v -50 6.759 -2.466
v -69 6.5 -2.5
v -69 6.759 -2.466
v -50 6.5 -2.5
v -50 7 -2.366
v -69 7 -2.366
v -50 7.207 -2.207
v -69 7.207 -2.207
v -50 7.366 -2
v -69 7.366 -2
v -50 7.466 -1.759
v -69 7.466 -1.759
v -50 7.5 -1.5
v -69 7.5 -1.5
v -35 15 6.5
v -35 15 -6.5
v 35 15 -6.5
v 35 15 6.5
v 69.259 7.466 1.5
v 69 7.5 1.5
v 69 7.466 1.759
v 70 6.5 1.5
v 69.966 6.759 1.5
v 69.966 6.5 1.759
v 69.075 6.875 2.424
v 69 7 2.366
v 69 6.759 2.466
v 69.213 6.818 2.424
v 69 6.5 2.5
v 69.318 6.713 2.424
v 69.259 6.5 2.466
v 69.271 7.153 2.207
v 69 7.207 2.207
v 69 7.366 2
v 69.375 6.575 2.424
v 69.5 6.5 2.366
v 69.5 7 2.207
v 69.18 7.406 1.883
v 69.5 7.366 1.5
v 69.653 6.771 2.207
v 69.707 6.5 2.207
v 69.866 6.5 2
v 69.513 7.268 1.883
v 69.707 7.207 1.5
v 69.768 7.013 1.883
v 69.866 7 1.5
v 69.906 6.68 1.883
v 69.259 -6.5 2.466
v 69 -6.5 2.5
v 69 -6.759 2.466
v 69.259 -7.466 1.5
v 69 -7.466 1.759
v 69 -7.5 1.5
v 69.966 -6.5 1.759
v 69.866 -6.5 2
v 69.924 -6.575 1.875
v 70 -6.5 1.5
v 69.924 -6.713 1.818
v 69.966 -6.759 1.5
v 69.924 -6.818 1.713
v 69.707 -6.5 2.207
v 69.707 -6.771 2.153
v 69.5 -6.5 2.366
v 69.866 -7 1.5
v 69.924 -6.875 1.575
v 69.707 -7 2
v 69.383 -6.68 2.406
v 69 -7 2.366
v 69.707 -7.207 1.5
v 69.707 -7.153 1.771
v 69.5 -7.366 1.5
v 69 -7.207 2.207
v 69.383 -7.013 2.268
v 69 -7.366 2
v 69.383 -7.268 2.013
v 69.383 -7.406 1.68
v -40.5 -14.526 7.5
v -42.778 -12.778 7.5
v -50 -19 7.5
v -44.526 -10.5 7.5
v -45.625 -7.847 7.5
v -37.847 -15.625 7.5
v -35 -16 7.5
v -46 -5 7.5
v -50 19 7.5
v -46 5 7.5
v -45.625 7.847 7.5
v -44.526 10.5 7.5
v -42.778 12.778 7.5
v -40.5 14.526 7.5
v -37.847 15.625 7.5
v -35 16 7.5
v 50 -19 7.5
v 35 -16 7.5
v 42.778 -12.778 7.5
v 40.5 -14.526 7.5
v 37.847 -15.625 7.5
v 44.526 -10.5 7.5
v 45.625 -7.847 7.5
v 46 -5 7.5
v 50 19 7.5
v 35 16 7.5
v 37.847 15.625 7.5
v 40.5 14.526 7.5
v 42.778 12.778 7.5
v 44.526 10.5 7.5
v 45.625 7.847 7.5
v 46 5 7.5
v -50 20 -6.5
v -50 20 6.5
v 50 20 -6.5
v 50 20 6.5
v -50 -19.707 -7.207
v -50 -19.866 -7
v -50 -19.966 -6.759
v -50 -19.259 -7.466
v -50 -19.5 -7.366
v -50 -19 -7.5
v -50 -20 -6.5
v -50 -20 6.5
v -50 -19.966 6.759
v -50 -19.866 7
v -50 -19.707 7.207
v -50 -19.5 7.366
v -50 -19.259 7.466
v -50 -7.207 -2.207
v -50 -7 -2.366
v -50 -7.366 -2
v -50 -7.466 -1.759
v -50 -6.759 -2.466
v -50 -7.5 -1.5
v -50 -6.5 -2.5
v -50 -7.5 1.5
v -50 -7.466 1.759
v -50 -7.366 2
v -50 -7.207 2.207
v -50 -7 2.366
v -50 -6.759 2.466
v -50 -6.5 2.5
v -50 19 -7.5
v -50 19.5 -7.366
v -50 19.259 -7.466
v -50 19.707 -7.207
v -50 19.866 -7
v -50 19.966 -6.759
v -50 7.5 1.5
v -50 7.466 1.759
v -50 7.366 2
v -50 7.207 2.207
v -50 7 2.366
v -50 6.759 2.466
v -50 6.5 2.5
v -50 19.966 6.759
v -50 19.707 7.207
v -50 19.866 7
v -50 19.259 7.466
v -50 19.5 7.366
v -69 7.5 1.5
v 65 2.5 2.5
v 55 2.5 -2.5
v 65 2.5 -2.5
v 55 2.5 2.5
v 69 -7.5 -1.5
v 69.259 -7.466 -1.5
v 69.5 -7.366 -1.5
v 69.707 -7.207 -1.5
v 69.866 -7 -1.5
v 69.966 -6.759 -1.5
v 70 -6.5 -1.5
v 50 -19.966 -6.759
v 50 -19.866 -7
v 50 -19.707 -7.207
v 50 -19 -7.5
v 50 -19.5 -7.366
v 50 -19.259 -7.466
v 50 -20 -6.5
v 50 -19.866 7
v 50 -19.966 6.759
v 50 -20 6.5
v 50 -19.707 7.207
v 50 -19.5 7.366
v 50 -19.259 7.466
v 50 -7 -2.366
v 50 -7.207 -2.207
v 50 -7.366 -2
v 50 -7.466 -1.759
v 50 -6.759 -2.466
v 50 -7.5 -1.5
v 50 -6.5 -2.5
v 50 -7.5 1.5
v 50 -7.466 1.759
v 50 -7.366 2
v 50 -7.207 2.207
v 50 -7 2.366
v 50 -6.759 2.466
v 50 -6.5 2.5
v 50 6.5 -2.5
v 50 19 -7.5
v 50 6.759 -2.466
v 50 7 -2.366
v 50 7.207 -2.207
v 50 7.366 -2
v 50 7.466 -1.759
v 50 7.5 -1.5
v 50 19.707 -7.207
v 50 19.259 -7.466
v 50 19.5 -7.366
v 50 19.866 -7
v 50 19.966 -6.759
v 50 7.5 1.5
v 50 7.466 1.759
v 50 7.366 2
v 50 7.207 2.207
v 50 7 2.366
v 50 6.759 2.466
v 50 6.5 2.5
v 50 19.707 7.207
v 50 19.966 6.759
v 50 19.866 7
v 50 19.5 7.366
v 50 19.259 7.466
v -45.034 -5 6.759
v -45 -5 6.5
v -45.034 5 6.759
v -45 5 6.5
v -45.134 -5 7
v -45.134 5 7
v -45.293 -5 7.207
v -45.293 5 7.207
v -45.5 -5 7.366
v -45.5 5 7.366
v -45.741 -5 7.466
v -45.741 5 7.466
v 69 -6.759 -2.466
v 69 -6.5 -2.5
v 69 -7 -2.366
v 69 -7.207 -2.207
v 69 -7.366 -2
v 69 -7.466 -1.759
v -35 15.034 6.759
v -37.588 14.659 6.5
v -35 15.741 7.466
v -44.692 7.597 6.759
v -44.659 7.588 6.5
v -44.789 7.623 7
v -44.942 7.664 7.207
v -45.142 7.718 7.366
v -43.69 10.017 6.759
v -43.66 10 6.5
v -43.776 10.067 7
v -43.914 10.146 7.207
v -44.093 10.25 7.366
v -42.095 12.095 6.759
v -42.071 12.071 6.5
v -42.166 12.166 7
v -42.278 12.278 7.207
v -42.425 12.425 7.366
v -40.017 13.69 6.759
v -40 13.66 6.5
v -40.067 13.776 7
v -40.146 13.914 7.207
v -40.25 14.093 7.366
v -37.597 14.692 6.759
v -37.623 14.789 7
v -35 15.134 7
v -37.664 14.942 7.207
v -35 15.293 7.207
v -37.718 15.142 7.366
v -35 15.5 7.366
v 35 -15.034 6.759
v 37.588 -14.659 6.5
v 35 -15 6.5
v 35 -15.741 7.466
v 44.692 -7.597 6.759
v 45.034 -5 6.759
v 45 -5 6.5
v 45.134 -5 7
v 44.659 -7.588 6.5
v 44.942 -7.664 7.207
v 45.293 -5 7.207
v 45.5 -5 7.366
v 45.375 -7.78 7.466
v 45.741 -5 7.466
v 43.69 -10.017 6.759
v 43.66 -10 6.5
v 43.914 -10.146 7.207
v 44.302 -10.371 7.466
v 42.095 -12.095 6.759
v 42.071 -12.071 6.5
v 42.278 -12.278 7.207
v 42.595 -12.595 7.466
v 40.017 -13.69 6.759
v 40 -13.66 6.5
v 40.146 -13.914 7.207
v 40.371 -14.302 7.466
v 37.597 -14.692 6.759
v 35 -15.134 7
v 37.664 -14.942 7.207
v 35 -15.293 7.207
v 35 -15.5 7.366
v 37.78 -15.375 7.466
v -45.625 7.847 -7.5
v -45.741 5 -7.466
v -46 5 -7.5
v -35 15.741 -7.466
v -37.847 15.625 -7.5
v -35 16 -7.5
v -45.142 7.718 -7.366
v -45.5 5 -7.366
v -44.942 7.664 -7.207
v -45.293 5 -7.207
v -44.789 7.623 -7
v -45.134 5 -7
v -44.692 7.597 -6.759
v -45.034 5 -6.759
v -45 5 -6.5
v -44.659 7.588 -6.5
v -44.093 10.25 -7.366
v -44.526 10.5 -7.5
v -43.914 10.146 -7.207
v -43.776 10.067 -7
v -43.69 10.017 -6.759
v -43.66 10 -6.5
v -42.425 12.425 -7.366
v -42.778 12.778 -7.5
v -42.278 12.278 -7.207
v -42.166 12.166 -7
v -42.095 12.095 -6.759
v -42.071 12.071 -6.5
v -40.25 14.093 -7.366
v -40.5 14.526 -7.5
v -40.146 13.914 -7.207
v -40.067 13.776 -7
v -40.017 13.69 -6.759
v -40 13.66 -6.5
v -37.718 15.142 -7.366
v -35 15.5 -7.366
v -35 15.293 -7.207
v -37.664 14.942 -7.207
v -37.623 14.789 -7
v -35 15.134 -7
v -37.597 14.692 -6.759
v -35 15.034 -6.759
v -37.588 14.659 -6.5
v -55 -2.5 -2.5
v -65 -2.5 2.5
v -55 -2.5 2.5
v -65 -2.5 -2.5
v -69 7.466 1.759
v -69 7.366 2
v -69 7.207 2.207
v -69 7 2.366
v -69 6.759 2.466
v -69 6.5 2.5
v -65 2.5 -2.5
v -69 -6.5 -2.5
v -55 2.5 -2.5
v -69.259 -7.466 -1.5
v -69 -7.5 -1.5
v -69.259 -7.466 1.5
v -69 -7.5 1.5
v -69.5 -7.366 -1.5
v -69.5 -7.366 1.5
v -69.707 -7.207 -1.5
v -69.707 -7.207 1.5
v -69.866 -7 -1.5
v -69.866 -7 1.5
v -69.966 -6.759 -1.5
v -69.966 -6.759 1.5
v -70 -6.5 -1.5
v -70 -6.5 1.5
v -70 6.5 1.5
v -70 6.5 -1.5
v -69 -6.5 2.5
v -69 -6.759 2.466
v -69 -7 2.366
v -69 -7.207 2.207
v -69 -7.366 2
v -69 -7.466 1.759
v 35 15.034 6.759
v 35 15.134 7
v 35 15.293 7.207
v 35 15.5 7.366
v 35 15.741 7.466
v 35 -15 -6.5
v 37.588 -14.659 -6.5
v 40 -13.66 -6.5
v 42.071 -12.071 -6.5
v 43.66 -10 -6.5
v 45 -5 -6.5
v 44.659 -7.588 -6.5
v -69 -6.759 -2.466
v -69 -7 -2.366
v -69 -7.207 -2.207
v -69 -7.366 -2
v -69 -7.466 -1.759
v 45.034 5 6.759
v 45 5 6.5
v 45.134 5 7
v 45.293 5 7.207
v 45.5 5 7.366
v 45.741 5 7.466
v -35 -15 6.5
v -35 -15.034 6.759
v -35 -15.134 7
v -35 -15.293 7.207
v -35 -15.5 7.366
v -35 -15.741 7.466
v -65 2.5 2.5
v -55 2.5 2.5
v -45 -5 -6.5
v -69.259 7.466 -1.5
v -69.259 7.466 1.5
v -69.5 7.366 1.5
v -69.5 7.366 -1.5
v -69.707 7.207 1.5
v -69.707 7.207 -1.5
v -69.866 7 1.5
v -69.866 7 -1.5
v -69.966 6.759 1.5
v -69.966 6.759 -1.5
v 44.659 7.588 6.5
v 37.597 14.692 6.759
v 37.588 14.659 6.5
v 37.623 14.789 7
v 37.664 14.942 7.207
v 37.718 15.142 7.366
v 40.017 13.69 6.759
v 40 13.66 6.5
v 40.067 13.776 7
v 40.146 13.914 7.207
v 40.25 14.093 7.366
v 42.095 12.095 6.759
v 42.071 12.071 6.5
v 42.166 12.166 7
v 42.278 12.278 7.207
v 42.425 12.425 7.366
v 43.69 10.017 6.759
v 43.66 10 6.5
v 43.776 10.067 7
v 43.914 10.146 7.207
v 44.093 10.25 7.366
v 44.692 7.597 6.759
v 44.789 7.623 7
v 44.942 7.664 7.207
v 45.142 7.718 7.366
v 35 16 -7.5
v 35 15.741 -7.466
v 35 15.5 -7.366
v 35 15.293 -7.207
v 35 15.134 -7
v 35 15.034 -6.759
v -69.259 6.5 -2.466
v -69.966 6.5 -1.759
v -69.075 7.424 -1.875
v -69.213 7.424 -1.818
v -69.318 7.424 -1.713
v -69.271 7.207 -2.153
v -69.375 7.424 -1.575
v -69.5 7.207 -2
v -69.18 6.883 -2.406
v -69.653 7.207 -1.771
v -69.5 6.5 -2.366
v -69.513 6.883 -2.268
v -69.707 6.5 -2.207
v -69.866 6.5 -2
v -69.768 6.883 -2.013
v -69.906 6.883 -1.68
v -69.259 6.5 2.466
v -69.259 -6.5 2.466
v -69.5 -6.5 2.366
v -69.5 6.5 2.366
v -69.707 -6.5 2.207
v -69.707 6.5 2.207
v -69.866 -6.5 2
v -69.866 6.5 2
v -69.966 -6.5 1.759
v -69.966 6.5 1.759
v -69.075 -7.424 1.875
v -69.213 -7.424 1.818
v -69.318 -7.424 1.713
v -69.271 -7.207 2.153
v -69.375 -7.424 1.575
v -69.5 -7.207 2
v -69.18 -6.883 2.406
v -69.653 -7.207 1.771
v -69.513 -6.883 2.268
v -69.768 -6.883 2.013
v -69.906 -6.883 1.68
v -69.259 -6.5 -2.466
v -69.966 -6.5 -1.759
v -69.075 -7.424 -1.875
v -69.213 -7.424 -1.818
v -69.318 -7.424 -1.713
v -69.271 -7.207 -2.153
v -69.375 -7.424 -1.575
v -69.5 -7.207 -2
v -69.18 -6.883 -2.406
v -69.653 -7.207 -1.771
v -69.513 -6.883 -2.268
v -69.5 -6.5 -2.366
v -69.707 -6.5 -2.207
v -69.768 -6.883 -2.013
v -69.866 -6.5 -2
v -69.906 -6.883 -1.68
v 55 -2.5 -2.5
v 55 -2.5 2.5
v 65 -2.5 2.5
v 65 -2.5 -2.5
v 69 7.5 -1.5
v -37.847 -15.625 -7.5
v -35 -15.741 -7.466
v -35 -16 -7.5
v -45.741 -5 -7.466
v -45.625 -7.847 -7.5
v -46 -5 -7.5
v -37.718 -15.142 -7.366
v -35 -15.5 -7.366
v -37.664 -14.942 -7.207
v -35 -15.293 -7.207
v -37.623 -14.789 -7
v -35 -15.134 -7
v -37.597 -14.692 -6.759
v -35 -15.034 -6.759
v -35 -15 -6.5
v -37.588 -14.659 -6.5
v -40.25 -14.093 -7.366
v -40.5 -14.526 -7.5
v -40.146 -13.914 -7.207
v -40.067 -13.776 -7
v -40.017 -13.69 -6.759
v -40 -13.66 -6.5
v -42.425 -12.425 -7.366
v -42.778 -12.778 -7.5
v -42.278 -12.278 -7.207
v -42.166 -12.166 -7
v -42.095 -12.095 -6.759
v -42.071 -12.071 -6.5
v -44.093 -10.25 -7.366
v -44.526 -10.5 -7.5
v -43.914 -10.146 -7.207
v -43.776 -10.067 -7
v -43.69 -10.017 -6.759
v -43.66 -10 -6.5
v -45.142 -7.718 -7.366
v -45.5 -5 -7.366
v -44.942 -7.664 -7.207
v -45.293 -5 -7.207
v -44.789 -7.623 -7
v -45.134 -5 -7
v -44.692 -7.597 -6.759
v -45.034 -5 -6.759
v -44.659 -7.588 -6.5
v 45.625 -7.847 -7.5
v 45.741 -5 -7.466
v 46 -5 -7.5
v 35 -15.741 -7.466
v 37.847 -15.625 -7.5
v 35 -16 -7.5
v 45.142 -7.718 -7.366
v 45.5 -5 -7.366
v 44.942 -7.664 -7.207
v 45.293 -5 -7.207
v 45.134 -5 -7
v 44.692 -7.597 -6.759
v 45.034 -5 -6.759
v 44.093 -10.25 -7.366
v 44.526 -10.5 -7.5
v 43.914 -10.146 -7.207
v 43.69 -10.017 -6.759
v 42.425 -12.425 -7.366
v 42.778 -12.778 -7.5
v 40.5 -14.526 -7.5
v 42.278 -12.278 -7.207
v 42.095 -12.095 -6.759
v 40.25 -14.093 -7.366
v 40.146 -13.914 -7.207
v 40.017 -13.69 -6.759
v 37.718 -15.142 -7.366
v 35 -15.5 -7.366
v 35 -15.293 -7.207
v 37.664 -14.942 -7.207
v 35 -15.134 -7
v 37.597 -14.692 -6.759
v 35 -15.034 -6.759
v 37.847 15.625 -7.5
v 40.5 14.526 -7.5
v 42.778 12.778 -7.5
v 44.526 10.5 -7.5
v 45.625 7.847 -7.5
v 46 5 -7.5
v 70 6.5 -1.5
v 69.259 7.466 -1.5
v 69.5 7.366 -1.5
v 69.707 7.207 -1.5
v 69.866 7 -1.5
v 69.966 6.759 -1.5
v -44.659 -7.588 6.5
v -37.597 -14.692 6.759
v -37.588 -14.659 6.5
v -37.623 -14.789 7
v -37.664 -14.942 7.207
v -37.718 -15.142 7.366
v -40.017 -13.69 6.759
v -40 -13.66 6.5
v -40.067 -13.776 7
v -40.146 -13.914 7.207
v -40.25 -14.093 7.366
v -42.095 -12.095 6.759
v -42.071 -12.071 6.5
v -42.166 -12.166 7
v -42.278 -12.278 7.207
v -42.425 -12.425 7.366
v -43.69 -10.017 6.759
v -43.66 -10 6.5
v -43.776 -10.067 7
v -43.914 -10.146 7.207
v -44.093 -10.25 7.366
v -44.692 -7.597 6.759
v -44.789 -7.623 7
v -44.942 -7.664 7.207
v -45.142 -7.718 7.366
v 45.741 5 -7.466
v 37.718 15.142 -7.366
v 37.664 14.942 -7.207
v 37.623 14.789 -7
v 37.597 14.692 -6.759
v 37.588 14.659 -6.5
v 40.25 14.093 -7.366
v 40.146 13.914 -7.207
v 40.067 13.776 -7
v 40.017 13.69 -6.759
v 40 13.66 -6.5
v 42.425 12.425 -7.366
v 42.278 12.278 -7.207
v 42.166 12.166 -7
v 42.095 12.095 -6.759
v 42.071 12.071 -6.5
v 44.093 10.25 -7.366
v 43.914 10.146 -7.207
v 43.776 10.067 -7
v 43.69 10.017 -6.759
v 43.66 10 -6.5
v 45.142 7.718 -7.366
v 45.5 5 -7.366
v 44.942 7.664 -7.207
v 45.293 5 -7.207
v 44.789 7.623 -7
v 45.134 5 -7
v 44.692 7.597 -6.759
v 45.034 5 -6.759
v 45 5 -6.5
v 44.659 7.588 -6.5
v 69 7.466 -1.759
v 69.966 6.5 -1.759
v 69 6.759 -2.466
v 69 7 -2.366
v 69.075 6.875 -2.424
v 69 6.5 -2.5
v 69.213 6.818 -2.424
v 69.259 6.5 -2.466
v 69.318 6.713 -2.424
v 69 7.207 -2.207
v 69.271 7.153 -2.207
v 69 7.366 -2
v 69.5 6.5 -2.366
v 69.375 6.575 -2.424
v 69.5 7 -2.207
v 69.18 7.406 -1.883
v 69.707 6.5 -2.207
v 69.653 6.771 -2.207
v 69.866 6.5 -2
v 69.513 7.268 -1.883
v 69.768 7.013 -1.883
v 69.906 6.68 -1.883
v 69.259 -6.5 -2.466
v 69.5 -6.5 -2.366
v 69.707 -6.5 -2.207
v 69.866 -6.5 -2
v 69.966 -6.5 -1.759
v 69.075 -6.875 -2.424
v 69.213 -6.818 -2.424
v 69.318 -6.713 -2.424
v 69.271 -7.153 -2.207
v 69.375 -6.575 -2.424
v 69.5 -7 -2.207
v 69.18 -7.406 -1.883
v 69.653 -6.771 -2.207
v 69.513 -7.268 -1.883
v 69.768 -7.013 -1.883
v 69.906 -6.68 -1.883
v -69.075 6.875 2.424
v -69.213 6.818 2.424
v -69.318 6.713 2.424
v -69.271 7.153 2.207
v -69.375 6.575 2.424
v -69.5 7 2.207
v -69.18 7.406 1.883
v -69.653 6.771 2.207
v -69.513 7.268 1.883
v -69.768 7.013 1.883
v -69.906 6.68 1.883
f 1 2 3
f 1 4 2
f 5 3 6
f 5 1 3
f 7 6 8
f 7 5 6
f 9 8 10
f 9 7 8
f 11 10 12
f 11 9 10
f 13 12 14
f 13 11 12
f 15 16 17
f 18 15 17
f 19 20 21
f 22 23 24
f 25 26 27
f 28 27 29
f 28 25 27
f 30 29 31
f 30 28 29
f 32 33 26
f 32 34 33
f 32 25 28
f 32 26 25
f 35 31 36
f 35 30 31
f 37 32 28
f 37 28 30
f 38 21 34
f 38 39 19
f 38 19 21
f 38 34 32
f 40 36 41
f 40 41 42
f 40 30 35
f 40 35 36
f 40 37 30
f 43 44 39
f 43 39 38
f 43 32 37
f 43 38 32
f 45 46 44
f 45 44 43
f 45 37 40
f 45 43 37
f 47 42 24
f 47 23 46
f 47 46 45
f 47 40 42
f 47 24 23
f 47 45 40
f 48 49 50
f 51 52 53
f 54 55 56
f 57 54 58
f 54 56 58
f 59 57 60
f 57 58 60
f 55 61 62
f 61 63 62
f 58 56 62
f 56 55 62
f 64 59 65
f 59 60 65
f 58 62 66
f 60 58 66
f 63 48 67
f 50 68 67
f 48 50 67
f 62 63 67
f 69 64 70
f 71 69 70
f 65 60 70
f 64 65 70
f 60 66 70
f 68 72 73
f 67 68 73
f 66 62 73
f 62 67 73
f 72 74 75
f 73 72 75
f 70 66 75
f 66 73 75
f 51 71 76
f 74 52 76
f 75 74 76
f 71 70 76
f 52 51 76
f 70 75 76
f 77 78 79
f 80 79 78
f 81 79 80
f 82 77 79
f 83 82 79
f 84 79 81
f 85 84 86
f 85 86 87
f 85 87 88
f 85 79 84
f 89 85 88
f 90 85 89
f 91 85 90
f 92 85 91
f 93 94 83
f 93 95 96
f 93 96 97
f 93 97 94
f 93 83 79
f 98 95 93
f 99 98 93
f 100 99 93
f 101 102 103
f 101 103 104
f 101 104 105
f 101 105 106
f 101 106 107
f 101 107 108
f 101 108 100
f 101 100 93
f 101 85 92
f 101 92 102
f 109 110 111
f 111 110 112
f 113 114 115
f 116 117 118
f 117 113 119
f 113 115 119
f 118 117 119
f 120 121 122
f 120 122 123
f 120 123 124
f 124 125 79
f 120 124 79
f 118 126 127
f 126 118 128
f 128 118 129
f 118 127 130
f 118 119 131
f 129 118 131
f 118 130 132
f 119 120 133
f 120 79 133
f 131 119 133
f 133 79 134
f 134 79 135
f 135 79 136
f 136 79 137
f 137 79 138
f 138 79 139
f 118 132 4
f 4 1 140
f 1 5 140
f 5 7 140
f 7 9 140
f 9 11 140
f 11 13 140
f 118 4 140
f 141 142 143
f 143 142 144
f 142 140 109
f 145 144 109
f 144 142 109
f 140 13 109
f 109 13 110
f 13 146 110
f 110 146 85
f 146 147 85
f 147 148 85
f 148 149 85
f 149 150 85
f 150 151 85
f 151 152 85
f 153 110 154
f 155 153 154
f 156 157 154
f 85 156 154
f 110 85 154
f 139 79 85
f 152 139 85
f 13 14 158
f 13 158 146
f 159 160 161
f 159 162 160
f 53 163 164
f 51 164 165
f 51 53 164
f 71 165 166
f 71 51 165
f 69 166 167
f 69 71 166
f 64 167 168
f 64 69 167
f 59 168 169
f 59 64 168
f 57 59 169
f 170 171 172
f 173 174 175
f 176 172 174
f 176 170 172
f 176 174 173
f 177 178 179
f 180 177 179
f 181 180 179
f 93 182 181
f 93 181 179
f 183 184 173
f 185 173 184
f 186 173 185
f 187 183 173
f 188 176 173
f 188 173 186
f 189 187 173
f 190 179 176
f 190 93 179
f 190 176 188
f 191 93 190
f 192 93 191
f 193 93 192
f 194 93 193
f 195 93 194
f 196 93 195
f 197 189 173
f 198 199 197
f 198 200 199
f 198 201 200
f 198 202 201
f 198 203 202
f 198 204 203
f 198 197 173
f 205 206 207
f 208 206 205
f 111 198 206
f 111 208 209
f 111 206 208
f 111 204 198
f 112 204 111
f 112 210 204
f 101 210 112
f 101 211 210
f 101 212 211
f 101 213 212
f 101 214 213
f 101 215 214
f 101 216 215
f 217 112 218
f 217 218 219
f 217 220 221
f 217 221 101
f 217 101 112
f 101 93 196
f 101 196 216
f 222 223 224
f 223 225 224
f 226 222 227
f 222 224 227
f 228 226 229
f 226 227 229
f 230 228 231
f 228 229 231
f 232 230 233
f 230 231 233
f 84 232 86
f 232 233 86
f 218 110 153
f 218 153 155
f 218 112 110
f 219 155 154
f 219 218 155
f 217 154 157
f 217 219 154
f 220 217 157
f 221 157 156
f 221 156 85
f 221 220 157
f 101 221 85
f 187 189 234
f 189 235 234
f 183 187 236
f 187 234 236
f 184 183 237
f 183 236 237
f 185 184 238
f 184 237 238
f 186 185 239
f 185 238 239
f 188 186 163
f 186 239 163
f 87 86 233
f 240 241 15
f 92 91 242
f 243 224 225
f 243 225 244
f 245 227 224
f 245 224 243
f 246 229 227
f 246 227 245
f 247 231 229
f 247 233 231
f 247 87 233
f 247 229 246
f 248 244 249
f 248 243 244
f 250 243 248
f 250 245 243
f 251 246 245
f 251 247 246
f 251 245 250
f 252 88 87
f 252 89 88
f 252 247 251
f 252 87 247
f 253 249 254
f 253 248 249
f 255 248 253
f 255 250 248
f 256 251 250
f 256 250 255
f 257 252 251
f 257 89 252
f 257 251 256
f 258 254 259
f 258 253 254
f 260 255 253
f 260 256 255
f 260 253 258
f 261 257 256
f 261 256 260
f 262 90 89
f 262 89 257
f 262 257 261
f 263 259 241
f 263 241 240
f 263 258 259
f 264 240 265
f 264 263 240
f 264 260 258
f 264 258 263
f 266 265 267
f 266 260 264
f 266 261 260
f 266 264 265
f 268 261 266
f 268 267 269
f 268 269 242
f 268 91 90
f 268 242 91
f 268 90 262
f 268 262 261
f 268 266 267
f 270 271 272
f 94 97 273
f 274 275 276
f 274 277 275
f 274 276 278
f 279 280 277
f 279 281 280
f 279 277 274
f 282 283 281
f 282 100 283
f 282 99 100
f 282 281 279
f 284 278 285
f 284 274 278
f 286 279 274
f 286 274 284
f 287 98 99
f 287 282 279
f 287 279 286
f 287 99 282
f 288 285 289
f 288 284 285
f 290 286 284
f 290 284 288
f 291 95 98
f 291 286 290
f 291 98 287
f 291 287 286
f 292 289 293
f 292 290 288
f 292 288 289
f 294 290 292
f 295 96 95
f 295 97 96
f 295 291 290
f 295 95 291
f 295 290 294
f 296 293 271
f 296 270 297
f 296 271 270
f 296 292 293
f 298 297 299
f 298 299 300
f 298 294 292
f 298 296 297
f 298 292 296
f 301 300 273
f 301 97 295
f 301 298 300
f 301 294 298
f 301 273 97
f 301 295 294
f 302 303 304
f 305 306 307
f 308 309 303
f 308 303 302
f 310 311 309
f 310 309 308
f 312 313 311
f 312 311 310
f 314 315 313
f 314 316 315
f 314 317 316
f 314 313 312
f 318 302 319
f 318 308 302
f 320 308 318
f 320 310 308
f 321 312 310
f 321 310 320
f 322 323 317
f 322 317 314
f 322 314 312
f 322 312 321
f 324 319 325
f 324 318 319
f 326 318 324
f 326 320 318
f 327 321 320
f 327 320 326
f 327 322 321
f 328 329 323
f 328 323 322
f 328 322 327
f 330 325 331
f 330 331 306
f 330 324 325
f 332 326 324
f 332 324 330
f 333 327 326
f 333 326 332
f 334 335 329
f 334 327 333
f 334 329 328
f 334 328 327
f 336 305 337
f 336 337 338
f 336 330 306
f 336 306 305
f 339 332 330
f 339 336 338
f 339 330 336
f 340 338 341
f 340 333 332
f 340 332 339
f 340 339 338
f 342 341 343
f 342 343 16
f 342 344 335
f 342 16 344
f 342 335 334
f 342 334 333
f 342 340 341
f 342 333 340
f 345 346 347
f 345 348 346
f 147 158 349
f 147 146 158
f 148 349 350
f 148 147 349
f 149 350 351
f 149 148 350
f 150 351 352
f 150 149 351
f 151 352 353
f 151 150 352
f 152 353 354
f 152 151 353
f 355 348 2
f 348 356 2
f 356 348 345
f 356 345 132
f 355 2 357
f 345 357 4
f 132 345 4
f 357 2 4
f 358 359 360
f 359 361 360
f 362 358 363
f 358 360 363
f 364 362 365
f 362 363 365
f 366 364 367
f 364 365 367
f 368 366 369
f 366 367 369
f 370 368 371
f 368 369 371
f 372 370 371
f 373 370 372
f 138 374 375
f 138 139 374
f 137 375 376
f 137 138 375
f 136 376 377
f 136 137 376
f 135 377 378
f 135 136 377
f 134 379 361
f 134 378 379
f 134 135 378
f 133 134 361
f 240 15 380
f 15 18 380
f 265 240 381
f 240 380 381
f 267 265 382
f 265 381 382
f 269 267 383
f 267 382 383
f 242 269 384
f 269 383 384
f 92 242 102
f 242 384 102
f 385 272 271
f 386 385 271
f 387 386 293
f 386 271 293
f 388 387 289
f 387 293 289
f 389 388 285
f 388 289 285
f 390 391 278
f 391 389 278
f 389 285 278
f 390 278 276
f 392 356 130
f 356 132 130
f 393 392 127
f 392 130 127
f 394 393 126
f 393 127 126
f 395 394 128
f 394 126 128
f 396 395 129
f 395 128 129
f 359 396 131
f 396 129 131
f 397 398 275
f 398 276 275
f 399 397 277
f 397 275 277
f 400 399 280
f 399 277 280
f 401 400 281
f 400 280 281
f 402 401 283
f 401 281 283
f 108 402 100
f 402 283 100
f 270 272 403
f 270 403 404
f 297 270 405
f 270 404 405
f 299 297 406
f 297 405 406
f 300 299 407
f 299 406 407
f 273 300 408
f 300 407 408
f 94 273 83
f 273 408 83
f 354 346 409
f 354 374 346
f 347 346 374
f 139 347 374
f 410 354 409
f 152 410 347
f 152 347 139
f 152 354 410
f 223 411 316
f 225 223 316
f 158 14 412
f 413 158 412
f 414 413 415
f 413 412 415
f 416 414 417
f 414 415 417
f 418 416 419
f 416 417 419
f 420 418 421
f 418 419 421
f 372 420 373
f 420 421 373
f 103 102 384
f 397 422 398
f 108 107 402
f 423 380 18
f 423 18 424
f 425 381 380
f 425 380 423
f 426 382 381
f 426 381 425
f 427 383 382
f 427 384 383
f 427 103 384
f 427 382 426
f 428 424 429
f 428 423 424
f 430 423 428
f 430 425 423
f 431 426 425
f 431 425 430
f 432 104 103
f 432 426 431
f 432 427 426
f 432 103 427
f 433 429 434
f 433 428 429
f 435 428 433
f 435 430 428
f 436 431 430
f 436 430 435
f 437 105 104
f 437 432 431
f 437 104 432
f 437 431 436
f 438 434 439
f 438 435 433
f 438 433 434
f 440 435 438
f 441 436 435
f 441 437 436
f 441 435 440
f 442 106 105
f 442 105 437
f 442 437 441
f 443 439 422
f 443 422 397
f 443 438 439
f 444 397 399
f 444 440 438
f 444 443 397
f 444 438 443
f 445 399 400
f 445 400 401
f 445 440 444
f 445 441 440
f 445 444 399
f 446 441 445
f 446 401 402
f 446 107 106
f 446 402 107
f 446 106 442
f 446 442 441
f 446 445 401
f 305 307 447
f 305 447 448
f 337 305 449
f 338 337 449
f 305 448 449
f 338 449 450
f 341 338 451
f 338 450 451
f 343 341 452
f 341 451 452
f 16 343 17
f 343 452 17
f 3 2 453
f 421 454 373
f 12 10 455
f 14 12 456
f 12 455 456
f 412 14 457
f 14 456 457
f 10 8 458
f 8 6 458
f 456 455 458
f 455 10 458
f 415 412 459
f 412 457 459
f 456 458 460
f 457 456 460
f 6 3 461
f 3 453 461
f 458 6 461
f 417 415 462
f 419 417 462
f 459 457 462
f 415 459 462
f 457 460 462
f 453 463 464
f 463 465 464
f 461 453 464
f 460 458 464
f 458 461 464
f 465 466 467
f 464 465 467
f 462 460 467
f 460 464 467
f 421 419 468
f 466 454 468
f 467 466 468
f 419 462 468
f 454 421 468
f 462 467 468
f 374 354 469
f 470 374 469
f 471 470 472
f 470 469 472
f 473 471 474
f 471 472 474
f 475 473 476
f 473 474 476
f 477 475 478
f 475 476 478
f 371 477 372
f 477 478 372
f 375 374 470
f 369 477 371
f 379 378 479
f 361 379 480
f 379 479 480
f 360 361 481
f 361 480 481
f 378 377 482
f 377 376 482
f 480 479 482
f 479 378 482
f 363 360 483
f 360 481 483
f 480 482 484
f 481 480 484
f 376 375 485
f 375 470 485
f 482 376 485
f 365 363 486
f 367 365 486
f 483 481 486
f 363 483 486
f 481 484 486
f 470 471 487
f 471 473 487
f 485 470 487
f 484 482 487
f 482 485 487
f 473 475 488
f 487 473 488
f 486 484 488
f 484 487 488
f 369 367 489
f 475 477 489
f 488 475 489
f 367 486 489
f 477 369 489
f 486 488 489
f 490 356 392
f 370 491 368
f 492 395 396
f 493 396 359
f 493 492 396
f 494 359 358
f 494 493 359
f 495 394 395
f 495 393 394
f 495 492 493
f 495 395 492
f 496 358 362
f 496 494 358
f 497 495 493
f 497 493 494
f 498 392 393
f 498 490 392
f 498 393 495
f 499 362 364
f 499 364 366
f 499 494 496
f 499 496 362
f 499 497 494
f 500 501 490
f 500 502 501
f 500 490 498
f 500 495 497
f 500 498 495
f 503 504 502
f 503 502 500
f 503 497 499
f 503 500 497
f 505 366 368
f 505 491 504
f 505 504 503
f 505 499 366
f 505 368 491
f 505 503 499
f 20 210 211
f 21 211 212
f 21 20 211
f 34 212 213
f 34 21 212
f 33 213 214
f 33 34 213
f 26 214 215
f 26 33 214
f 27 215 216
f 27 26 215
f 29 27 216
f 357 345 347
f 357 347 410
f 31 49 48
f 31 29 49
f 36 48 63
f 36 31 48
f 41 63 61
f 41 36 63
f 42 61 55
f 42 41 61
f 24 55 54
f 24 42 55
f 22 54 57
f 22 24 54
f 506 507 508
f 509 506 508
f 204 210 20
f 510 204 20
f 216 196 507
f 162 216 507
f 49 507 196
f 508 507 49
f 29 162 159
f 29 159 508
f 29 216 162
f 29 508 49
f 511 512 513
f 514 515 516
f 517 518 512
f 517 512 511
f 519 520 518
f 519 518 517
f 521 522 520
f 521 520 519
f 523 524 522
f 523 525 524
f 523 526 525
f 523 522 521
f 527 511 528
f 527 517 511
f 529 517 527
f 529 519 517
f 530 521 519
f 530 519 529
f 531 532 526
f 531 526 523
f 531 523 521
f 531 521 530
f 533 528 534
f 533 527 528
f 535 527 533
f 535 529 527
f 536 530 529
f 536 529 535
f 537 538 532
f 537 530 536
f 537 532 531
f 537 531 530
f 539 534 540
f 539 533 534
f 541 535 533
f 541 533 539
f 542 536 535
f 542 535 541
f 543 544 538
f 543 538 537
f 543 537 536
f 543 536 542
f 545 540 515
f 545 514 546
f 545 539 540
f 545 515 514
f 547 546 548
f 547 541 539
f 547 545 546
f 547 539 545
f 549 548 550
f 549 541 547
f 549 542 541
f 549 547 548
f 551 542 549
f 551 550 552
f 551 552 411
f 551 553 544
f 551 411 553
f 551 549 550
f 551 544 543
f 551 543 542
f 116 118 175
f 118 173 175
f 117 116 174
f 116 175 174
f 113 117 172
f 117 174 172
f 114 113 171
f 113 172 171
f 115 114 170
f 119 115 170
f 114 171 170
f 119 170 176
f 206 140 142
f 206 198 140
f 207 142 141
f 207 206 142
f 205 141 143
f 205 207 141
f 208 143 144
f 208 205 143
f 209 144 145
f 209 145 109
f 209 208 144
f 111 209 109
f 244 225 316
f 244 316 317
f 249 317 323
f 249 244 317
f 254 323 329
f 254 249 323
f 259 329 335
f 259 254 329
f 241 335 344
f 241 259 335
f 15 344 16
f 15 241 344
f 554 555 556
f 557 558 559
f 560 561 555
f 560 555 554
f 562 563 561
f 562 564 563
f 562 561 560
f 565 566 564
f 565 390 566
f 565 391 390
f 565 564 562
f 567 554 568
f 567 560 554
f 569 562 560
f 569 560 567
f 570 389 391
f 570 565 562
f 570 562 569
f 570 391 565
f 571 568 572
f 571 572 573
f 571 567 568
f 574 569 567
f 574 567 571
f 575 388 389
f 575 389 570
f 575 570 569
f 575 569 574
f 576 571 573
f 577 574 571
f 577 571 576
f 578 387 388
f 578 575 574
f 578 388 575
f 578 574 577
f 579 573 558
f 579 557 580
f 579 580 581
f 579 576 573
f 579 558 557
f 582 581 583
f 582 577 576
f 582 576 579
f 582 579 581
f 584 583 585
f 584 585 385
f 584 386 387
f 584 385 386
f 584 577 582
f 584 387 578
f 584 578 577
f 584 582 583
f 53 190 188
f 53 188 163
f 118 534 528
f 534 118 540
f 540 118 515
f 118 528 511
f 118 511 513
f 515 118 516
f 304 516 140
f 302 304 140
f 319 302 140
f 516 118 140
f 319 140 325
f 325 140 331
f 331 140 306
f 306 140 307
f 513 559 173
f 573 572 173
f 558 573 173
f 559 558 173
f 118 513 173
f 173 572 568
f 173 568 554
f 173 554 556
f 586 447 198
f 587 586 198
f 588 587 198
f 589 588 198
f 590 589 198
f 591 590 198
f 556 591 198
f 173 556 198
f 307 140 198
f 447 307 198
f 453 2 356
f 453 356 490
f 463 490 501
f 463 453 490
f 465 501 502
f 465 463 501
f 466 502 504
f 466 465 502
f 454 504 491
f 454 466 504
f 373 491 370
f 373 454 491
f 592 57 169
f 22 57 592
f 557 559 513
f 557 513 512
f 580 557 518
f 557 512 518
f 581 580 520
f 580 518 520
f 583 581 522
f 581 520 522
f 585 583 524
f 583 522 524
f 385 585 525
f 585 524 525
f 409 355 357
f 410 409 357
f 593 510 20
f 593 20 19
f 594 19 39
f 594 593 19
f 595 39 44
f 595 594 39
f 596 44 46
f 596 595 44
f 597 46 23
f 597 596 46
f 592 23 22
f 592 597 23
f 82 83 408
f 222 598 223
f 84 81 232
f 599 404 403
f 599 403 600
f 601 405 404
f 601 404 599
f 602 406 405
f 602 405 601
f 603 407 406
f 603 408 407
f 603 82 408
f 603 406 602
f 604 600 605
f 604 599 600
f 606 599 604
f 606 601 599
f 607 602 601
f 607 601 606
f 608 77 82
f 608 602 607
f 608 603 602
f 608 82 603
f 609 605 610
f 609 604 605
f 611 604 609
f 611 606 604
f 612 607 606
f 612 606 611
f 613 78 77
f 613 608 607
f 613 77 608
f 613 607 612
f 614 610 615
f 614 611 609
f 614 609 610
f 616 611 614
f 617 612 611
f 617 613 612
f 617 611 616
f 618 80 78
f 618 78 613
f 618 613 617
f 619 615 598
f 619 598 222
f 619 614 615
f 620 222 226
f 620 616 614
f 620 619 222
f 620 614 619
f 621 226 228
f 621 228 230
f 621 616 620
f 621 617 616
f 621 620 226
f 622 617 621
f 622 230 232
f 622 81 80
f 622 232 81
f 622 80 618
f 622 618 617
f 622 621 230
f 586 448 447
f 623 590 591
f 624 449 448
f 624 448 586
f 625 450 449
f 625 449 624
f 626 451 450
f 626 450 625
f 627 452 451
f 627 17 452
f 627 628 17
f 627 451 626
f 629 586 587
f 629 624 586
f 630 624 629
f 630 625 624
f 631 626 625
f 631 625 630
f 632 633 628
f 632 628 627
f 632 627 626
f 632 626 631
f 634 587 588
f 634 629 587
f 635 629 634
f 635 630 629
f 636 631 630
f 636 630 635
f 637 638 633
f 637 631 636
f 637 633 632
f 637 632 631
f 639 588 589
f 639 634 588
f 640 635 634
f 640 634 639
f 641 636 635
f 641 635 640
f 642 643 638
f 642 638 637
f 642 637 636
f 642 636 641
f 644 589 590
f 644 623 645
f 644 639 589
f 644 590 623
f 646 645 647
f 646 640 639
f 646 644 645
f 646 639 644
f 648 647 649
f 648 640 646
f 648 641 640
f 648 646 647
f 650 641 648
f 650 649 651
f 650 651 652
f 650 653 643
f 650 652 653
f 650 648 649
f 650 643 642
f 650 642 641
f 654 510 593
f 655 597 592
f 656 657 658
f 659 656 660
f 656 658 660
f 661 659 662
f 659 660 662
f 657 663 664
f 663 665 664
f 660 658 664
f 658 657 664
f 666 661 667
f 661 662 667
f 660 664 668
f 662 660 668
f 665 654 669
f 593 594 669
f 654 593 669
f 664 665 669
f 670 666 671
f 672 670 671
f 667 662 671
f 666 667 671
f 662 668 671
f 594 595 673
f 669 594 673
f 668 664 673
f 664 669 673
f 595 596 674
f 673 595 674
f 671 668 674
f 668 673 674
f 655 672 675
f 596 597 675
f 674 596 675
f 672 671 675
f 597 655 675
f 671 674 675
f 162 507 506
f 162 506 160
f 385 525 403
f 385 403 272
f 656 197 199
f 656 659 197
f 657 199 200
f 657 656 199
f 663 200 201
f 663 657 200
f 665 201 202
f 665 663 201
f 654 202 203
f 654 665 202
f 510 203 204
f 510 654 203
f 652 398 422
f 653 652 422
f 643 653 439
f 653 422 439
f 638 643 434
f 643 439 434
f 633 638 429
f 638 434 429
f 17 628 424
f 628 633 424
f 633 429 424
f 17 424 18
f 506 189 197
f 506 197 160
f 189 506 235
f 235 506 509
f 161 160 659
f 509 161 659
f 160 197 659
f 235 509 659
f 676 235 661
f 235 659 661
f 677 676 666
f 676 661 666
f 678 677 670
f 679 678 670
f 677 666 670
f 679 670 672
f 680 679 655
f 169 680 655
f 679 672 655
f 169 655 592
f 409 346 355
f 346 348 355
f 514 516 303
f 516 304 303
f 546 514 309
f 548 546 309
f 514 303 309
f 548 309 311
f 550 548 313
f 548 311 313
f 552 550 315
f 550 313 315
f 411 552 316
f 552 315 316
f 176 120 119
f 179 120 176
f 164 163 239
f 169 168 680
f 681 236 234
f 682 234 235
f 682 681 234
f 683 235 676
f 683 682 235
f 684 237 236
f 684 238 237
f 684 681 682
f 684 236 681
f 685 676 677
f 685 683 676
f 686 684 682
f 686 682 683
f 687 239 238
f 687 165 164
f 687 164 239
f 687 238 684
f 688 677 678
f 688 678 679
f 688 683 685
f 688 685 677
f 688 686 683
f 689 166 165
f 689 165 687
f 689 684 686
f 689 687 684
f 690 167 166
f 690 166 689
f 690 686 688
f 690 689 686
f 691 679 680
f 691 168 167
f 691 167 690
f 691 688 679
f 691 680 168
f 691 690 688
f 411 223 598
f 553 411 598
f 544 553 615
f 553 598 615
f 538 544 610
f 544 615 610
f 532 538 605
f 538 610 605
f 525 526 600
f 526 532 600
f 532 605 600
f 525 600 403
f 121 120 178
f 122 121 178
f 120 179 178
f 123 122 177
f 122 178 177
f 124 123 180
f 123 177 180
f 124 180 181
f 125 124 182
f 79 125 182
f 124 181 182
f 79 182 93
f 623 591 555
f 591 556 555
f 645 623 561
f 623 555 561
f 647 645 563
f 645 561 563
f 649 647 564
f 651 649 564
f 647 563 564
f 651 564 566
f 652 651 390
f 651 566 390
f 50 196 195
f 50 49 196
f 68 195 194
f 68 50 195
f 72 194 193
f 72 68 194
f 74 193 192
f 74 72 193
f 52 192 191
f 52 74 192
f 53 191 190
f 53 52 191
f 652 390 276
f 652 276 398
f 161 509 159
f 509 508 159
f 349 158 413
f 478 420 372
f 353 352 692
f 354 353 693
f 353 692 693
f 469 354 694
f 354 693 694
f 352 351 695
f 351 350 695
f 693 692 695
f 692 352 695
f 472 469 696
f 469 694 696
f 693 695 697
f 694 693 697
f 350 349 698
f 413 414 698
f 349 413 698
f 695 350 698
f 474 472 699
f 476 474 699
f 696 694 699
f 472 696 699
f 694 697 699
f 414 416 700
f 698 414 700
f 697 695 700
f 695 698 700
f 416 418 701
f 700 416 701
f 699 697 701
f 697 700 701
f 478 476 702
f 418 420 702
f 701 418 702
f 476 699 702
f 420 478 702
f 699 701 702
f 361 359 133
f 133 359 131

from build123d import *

# Parameters (mm, degrees)
SKETCH001_W      = 20
SKETCH001_H      = 15
SKETCH001_W_2    = 10
SKETCH001_H_2    = 5
EXTRUDE001_DEPTH = 2.5
SKETCH002_W      = 90
SKETCH002_H      = 30
EXTRUDE002_DEPTH = 40
SKETCH_W         = 100
SKETCH_H         = 40
EXTRUDE_DEPTH    = 7.5
FILLET_R         = 10
FILLET001_R      = 1
FILLET002_R      = 1
FILLET003_R      = 1
FILLET004_R      = 1


with BuildPart() as extrude001:
    # Sketch001 (on Sketch) → Extrude001 (new body, symmetric)
    with BuildSketch(Plane.XY):
        with Locations((-60, 0)):
            Rectangle(SKETCH001_W, SKETCH001_H)
        with Locations((-60, 0)):
            Rectangle(SKETCH001_W_2, SKETCH001_H_2, mode=Mode.SUBTRACT)
        with Locations((60, 0)):
            Rectangle(SKETCH001_W, SKETCH001_H)
        with Locations((60, 0)):
            Rectangle(SKETCH001_W_2, SKETCH001_H_2, mode=Mode.SUBTRACT)
    extrude(amount=EXTRUDE001_DEPTH, both=True)


with BuildPart() as extrude002:
    # Sketch002 (on Face6 of Extrude) → Extrude002 (new body)
    with BuildSketch(Plane.XY.offset(7.5)):
        Rectangle(SKETCH002_W, SKETCH002_H)
    extrude(amount=EXTRUDE002_DEPTH)


with BuildPart() as extrude002_1:
    # Extrude002 placement: moved
    add(extrude002.part.moved(Location((0, 0, -28))))


with BuildPart() as fillet004:
    # Sketch → Extrude (new body, symmetric)
    with BuildSketch(Plane.XY):
        Rectangle(SKETCH_W, SKETCH_H)
    extrude(amount=EXTRUDE_DEPTH, both=True)

    # Cut: cut Extrude002
    add(extrude002_1.part, mode=Mode.SUBTRACT)

    # Fillet
    fillet_edges = [fillet004.edges().sort_by_distance(p)[0] for p in [
        (45, -15, 0),
        (-45, -15, 0),
        (45, 15, 0),
        (-45, 15, 0),
    ]]
    fillet(fillet_edges, radius=FILLET_R)

    # Fusion: union Extrude001
    add(extrude001.part)

    # Fillet001
    fillet001_edges = [fillet004.edges().sort_by_distance(p)[0] for p in [
        (0, -20, -7.5),
        (0, 20, -7.5),
        (0, -20, 7.5),
        (0, 20, 7.5),
    ]]
    fillet(fillet001_edges, radius=FILLET001_R)

    # Fillet002
    fillet002_edges = [fillet004.edges().sort_by_distance(p)[0] for p in [
        (0, -15, -7.5),
        (42.071068, -12.071068, -7.5),
        (-42.071068, -12.071068, -7.5),
        (45, 0, -7.5),
        (-45, 0, -7.5),
        (42.071068, 12.071068, -7.5),
        (-42.071068, 12.071068, -7.5),
        (0, 15, -7.5),
        (0, -15, 7.5),
        (42.071068, -12.071068, 7.5),
        (-42.071068, -12.071068, 7.5),
        (45, 0, 7.5),
        (-45, 0, 7.5),
        (42.071068, 12.071068, 7.5),
        (-42.071068, 12.071068, 7.5),
        (0, 15, 7.5),
    ]]
    fillet(fillet002_edges, radius=FILLET002_R)

    # Fillet003
    fillet003_edges = [fillet004.edges().sort_by_distance(p)[0] for p in [
        (70, 7.5, 0),
        (60, 7.5, -2.5),
        (60, 7.5, 2.5),
        (60, -7.5, 2.5),
        (70, 0, 2.5),
        (70, -7.5, 0),
        (60, -7.5, -2.5),
        (70, 0, -2.5),
    ]]
    fillet(fillet003_edges, radius=FILLET003_R)

    # Fillet004
    fillet004_edges = [fillet004.edges().sort_by_distance(p)[0] for p in [
        (-70, 0, -2.5),
        (-60, -7.5, -2.5),
        (-60, 7.5, -2.5),
        (-70, 7.5, 0),
        (-60, 7.5, 2.5),
        (-70, 0, 2.5),
        (-60, -7.5, 2.5),
        (-70, -7.5, 0),
    ]]
    fillet(fillet004_edges, radius=FILLET004_R)


solid = fillet004.part
